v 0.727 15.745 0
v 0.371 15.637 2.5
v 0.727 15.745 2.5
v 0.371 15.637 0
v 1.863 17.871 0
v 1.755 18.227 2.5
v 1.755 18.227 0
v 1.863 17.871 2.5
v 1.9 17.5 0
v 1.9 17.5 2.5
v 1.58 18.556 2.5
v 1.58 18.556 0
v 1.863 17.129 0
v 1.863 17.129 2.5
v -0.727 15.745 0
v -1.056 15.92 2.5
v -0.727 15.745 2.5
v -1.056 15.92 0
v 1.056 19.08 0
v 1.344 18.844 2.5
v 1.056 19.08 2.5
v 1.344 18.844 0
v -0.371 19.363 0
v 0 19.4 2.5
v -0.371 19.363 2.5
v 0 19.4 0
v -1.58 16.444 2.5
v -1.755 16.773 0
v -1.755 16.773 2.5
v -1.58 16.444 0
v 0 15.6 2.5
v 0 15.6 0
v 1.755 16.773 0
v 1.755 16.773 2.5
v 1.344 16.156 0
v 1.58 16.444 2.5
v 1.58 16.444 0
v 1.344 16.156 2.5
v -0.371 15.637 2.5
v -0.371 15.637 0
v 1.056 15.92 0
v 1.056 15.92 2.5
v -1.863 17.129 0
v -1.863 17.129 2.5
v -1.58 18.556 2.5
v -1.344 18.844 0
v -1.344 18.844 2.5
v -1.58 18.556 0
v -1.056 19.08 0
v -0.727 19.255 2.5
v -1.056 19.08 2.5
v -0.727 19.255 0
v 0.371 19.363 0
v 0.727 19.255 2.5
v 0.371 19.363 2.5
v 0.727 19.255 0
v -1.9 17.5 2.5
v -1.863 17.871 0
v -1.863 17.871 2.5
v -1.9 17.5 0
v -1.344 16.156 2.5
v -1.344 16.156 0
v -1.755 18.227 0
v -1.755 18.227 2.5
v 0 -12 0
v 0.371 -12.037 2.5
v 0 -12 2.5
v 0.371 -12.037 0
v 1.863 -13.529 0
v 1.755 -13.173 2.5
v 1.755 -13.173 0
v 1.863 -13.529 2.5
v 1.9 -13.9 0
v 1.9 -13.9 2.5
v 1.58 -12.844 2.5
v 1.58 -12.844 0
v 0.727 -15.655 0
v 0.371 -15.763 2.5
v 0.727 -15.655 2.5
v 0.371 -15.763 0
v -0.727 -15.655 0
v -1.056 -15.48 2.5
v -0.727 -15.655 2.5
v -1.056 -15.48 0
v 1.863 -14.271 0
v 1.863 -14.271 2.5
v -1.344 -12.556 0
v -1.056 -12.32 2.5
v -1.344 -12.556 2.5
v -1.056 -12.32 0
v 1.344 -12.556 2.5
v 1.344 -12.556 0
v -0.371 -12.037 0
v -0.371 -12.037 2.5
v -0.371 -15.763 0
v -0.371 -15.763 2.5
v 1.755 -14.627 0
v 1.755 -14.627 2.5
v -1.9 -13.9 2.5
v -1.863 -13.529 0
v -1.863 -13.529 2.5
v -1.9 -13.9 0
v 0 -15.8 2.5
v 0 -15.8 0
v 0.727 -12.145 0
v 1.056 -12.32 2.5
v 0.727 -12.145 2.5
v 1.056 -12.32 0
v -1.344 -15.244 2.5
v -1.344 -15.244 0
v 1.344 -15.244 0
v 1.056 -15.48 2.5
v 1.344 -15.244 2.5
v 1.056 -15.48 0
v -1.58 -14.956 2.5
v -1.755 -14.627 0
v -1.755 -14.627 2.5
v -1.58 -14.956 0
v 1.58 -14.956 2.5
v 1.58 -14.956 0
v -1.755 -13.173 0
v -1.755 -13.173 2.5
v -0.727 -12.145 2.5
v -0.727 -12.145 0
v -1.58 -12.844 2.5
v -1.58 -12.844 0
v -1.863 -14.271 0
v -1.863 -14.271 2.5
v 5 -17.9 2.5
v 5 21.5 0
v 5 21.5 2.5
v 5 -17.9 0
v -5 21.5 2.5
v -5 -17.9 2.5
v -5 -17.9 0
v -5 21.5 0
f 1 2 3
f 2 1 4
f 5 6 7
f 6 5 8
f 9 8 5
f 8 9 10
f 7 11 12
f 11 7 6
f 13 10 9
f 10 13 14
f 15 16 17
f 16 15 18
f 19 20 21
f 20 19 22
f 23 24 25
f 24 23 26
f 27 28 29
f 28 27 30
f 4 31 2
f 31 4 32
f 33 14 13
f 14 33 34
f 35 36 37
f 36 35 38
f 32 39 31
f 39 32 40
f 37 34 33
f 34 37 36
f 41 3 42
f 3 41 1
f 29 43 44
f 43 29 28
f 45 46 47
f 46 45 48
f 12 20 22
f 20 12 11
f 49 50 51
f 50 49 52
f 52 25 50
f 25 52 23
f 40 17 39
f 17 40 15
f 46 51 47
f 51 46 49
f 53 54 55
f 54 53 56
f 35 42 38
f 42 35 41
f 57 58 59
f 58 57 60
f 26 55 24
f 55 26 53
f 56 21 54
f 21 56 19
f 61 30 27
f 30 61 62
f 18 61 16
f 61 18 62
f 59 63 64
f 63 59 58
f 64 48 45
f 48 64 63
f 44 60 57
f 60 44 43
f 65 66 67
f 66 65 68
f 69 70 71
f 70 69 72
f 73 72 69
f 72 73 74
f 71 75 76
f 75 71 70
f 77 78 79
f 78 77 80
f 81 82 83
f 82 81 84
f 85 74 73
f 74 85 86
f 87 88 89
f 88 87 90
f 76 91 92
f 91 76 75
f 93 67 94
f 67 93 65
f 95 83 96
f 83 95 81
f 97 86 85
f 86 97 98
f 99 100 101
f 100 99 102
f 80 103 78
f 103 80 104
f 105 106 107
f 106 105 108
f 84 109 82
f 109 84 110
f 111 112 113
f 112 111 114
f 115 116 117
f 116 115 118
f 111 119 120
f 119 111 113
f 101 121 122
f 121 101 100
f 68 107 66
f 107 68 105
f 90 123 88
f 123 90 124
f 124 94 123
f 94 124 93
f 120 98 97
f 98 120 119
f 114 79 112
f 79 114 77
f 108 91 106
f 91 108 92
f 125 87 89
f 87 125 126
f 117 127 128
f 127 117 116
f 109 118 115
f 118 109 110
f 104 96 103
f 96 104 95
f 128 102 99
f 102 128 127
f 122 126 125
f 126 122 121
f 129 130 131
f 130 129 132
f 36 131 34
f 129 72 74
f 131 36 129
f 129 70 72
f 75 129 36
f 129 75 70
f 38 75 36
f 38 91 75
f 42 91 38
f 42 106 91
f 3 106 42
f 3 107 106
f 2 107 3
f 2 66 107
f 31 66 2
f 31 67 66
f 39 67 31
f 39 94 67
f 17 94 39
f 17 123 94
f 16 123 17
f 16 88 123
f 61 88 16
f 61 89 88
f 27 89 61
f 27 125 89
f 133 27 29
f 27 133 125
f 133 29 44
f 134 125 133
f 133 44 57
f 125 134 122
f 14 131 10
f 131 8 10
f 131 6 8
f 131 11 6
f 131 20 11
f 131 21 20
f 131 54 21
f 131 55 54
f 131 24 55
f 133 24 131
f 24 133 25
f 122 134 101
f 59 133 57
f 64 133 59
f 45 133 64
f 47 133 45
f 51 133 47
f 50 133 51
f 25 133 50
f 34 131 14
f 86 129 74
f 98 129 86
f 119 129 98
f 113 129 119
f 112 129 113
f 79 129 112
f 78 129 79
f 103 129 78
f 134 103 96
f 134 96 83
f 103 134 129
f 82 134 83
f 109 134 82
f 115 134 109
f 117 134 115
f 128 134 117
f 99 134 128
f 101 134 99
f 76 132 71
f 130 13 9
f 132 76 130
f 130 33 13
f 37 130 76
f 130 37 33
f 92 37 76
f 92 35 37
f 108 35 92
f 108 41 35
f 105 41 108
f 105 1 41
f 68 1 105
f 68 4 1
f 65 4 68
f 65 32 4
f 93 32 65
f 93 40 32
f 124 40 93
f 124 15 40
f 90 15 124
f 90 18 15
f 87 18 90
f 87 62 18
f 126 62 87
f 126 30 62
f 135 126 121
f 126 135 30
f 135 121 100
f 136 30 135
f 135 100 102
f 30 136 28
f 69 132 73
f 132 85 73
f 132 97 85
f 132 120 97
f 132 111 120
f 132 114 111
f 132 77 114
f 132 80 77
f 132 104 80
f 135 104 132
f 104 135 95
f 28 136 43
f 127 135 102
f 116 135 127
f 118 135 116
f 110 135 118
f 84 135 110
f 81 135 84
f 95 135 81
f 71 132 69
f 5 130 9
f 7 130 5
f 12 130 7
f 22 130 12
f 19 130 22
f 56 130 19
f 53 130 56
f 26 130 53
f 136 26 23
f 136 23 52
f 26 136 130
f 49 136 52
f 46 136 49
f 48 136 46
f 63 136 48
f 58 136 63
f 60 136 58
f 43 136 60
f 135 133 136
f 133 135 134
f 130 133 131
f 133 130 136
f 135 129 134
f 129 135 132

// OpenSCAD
// file: ../../head.scad
// Head - shared dimensions for the face plate, shell, camera plate and floor (concept:
// concepts/head_brow_concept.scad). The head sits straight on the turntable plate, no neck.
//
// Frame: origin at the centre of the turntable plate's top; +Y = front (face), +Z = up.
//
//   FACE   head_face.scad: the front of the box part - two round GC9A01 eyes and the 2.08" OLED
//          mouth, each dropped into a pocket from behind (it centres them) and hot-glued
//   SHELL  head_shell.scad: sides, back and the ARCH on top (a half cylinder across the full width
//          and depth); the camera looks out of a small window in the arch's front curve
//   CAMERA head_cam_plate.scad: holds the bare C920 board at cam_tilt, screwed inside the arch
//   FLOOR  head_floor.scad: screws to the turntable plate; the head ESP32-S3 sits on it
include <params.scad>

// ---- outline ------------------------------------------------------------------------------------
hb_w     = 135;              // width (X)
hb_d     = 70;               // depth (Y)
box_h    = 88;               // the box part (face height); the arch adds arch_r on top -> 123
hb_r     = 20;               // bottom corners, seen from the front (the top meets the arch square)
hb_wall  = 2.5;              // shell walls
arch_r   = hb_d / 2;         // 35: the arch spans the full depth; its axis runs along X at
arch_z   = box_h;            //   y = 0, z = box_h
face_t   = 3.0;              // face plate
face_y   = hb_d / 2;         // 35: front surface of the face

// ---- eyes (module dims: params.scad eye_*) ------------------------------------------------------
eye_dx    = 32;              // eye centres at x = +/- eye_dx
eye_z     = 55;              // eye centre height. Modules mount UPSIDE DOWN (pin tab up; the image
                             //   is flipped in software): the tab then points into the free space
                             //   under the arch, away from the mouth
eye_win   = 34;              // window: the 32.4 mm picture + a thin black margin of glass; hides the
                             //   glass edge and its flex cable
eye_skin  = 1.2;             // face material in front of the display
eye_pocket = eye_board_d + 0.5;     // the board drops into this and centres the display
eye_depth = eye_t + 0.3;     // pocket depth behind the skin

// ---- mouth: 2.08" OLED (params.scad oled_*) ---------------------------------------------------------
mouth_z   = 23;              // centre of the visible area: the module's lower edge clears the floor's tabs
mouth_pin = -1;              // the module's pin end points to -X (seen from the front: the left)
m_win     = oled_va + [0.6, 0.6];   // window: the visible area + 0.3 each side
m_skin    = 1.2;
// along X, from the visible area's centre: the glass's and the board's centres (pins at -X)
m_glass_dx = -mouth_pin * (oled_glass_x + oled_glass[0] / 2 - (oled_va_x + oled_va[0] / 2));   // +2.56
m_pcb_dx   = -mouth_pin * (oled_pcb[0] / 2 - (oled_va_x + oled_va[0] / 2));                     // +1.82

// ---- camera: bare C920 board, in the arch ----------------------------------------------------------
cam_tilt  = 18;              // fixed, up. Lens ~278 mm above the desk: eyes 300-500 mm high at
                             //   300-600 mm are 2..37 deg up; the 43 deg view (16:9) at 18 covers -3..40
cam_board = [80, 22];        // MEASURED (eye_test_stand.scad)
cam_board_t = 1.3;
cam_lens_h  = 14.0;          // board front -> front of the lens
cam_lens_d  = 11;            // lens barrel across its flanges
cam_win     = cam_lens_d + 2 * 2;   // window round the lens (eye test stand, print 2: small is best)
cam_recess  = 0.5;           // lens front this far inside the arch's surface
// the lens axis runs radially out of the arch at cam_tilt: lens front at arch_r - cam_recess
cam_r_lens  = arch_r - cam_recess;                  // 34.5 from the arch axis
cam_r_board = cam_r_lens - cam_lens_h;              // 20.5: board front

// ---- joints -------------------------------------------------------------------------------------------
// face plate -> shell: four M3 screws from inside, through tabs on the shell, into inserts in the
// face's bosses
face_boss_d   = 8;
face_boss_len = 9;           // behind the face's back
face_bosses   = [[-55, 14], [55, 14], [-58, 64], [58, 64]];   // (x, z): the upper pair low enough to
                                                                //   clear the camera plate's flanges

// floor: head_floor.scad. It screws DOWN into four inserts in the turntable plate (head-frame
// positions below); the shell hooks onto it at the front (two tongues on the face plate into slots
// in the floor's front tabs) and screws to it at the back (two M3 through the back wall)
floor_t      = 4.5;          // pockets underneath clear the lazy Susan's M5 nuts + bolt tips
floor_clr    = 0.4;          // gap to the shell's walls, each side
floor_x      = 47;           // half-width: the shell's open bottom is +/-47.5 (rounded corners)
floor_y      = [-hb_d / 2 + hb_wall + floor_clr, face_y - face_t - floor_clr];
floor_mounts = [[-22, -22], [22, -22], [-22, 22], [22, 22]];  // M3 down into the turntable plate
head_rot_in_pulley = 45;     // the head's frame in turntable_pulley.scad's: there the motor is at 0 deg
                             //   when the head looks ahead, and Level 2 has it at motor_a = -45, so the
                             //   head's +Y (90 deg) is at 135
floor_nuts   = [[-50.5, 0], [50.5, 0]];   // the turntable plate's M5 nuts under the floor
floor_hole_d = 40;           // cables down into the turntable's hollow tube
back_screws  = [-30, 30];    // x of the two M3 screws through the back wall
back_screw_z = 10;
tongue_x     = [-30, 30];    // the face plate's tongues
tongue       = [10, 3, 7];   // width (X), height (Z), length (Y, back from the face plate)
tongue_z     = 7;            // centre height (under the mouth's collar)
// the head ESP32-S3 (Seeed XIAO ESP32S3, 21 x 17.8): in a pocket on the floor, USB-C toward the hole
mcu          = [21.0, 17.8];
mcu_c        = [33, 0];      // centre; long axis along X, USB at the -X end

module rr2d(w, h, r) { offset(r = r) square([w - 2 * r, h - 2 * r], center = true); }

// front outline of the box part: rounded bottom corners, square top; z = 0 .. h
module low2d(w = hb_w, h = box_h, r = hb_r) {
    hull() {
        for (sx = [-1, 1]) translate([sx * (w / 2 - r), r]) circle(r = r, $fn = 96);
        translate([-w / 2, h - 1]) square([w, 1]);
    }
}

// where the lens sits: frame at the lens front, looking along +Y (rotated cam_tilt up)
module at_lens() {
    translate([0, 0, arch_z]) rotate([cam_tilt, 0, 0]) translate([0, cam_r_lens, 0]) children();
}
// file: ../../head_cam.scad
// Head camera mount - shared by head_cam_plate.scad, head_cam_strap.scad and head_shell.scad.
//
// LENS FRAME: origin at the front of the lens; +Y = the view direction, +Z = "up" across the
// board, X = along the board (same X as the head). at_lens() (head.scad) places it in the head:
// the lens axis runs radially out of the arch, cam_tilt up.
//
// The bare C920 board (80 x 22) lies against the plate's BACK face, lens forward through it, as on
// the eye test stand (eye_test_stand.scad - its pocket / notch / bracket layout is proven):
//   * through the plate: the lens holder (square), the board's front parts (44 x 22), the coils'
//     bay, two notches for the microphones (they also index the board side to side)
//   * behind: two bosses with M3 inserts; a flat strap (head_cam_strap.scad) screws onto them
//     across the board's back, 1.7 mm clear of its back parts
//   * at each end a FLANGE against the side wall: two M3 screws from outside the head, through
//     the wall, into inserts in the flange
include <head.scad>

cam_plate_t  = 2.5;
cam_y_board  = -cam_lens_h;                 // -14: board front = plate back face
cam_y_front  = cam_y_board + cam_plate_t;   // -11.5: plate front face
cam_z_range  = [-18, 21.5];                 // plate extent across the board (Z): inside the arch
cam_x_flange = hb_w / 2 - hb_wall;          // 65: flange outer faces against the side walls
cam_flange_t = 7;                           // thick enough for an insert (bore along X)
cam_flange_y = [-27, cam_y_front];          // flange extent along Y
cam_mount_pts = [[-21, 12], [-21, -10]];    // [y, z] of the two screws in each flange
cam_lens_hole = 16.5;                       // square, for the 14 x 14 lens holder
cam_comp     = [44, 22];                    // the board's front parts (through)
cam_coil     = [4, 5];                      // bay off the pocket's -X side, from z = 0 up
cam_mic_d    = 6.1 + 0.7;
cam_mic_x    = 69.2 / 2 + 6.1 / 2;          // 37.65: microphone centres
cam_strap_holes = [17.5, -13.9];            // Z of the strap's screws (as the stand's bracket)
cam_boss_h   = 6;                           // bosses behind the plate: the strap lies on them
cam_boss_d   = 8;

// a point in the lens frame -> head frame (matches at_lens())
function cam_to_head(p) = let(y = p[1] + cam_r_lens, z = p[2])
    [p[0], y * cos(cam_tilt) - z * sin(cam_tilt), arch_z + y * sin(cam_tilt) + z * cos(cam_tilt)];
// main file
// Head camera strap - a flat bar across the back of the C920 board, screwed (2 x M3 x 6) onto the
// camera plate's two bosses. It lies 1.7 mm clear of the board's back parts and keeps the board
// against the plate.
//
// PRINT flat (as modelled), no supports.
include <../../head_cam.scad>

strap_w = 10;
strap_t = 2.5;
z0 = cam_strap_holes[1] - cam_boss_d / 2;
z1 = cam_strap_holes[0] + cam_boss_d / 2;

module cam_strap() {
    difference() {
        translate([-strap_w / 2, z0, 0]) cube([strap_w, z1 - z0, strap_t]);
        for (z = cam_strap_holes) translate([0, z, -1]) cylinder(d = 3.4 + cal_hole, h = strap_t + 2, $fn = 32);
    }
}

cam_strap();
